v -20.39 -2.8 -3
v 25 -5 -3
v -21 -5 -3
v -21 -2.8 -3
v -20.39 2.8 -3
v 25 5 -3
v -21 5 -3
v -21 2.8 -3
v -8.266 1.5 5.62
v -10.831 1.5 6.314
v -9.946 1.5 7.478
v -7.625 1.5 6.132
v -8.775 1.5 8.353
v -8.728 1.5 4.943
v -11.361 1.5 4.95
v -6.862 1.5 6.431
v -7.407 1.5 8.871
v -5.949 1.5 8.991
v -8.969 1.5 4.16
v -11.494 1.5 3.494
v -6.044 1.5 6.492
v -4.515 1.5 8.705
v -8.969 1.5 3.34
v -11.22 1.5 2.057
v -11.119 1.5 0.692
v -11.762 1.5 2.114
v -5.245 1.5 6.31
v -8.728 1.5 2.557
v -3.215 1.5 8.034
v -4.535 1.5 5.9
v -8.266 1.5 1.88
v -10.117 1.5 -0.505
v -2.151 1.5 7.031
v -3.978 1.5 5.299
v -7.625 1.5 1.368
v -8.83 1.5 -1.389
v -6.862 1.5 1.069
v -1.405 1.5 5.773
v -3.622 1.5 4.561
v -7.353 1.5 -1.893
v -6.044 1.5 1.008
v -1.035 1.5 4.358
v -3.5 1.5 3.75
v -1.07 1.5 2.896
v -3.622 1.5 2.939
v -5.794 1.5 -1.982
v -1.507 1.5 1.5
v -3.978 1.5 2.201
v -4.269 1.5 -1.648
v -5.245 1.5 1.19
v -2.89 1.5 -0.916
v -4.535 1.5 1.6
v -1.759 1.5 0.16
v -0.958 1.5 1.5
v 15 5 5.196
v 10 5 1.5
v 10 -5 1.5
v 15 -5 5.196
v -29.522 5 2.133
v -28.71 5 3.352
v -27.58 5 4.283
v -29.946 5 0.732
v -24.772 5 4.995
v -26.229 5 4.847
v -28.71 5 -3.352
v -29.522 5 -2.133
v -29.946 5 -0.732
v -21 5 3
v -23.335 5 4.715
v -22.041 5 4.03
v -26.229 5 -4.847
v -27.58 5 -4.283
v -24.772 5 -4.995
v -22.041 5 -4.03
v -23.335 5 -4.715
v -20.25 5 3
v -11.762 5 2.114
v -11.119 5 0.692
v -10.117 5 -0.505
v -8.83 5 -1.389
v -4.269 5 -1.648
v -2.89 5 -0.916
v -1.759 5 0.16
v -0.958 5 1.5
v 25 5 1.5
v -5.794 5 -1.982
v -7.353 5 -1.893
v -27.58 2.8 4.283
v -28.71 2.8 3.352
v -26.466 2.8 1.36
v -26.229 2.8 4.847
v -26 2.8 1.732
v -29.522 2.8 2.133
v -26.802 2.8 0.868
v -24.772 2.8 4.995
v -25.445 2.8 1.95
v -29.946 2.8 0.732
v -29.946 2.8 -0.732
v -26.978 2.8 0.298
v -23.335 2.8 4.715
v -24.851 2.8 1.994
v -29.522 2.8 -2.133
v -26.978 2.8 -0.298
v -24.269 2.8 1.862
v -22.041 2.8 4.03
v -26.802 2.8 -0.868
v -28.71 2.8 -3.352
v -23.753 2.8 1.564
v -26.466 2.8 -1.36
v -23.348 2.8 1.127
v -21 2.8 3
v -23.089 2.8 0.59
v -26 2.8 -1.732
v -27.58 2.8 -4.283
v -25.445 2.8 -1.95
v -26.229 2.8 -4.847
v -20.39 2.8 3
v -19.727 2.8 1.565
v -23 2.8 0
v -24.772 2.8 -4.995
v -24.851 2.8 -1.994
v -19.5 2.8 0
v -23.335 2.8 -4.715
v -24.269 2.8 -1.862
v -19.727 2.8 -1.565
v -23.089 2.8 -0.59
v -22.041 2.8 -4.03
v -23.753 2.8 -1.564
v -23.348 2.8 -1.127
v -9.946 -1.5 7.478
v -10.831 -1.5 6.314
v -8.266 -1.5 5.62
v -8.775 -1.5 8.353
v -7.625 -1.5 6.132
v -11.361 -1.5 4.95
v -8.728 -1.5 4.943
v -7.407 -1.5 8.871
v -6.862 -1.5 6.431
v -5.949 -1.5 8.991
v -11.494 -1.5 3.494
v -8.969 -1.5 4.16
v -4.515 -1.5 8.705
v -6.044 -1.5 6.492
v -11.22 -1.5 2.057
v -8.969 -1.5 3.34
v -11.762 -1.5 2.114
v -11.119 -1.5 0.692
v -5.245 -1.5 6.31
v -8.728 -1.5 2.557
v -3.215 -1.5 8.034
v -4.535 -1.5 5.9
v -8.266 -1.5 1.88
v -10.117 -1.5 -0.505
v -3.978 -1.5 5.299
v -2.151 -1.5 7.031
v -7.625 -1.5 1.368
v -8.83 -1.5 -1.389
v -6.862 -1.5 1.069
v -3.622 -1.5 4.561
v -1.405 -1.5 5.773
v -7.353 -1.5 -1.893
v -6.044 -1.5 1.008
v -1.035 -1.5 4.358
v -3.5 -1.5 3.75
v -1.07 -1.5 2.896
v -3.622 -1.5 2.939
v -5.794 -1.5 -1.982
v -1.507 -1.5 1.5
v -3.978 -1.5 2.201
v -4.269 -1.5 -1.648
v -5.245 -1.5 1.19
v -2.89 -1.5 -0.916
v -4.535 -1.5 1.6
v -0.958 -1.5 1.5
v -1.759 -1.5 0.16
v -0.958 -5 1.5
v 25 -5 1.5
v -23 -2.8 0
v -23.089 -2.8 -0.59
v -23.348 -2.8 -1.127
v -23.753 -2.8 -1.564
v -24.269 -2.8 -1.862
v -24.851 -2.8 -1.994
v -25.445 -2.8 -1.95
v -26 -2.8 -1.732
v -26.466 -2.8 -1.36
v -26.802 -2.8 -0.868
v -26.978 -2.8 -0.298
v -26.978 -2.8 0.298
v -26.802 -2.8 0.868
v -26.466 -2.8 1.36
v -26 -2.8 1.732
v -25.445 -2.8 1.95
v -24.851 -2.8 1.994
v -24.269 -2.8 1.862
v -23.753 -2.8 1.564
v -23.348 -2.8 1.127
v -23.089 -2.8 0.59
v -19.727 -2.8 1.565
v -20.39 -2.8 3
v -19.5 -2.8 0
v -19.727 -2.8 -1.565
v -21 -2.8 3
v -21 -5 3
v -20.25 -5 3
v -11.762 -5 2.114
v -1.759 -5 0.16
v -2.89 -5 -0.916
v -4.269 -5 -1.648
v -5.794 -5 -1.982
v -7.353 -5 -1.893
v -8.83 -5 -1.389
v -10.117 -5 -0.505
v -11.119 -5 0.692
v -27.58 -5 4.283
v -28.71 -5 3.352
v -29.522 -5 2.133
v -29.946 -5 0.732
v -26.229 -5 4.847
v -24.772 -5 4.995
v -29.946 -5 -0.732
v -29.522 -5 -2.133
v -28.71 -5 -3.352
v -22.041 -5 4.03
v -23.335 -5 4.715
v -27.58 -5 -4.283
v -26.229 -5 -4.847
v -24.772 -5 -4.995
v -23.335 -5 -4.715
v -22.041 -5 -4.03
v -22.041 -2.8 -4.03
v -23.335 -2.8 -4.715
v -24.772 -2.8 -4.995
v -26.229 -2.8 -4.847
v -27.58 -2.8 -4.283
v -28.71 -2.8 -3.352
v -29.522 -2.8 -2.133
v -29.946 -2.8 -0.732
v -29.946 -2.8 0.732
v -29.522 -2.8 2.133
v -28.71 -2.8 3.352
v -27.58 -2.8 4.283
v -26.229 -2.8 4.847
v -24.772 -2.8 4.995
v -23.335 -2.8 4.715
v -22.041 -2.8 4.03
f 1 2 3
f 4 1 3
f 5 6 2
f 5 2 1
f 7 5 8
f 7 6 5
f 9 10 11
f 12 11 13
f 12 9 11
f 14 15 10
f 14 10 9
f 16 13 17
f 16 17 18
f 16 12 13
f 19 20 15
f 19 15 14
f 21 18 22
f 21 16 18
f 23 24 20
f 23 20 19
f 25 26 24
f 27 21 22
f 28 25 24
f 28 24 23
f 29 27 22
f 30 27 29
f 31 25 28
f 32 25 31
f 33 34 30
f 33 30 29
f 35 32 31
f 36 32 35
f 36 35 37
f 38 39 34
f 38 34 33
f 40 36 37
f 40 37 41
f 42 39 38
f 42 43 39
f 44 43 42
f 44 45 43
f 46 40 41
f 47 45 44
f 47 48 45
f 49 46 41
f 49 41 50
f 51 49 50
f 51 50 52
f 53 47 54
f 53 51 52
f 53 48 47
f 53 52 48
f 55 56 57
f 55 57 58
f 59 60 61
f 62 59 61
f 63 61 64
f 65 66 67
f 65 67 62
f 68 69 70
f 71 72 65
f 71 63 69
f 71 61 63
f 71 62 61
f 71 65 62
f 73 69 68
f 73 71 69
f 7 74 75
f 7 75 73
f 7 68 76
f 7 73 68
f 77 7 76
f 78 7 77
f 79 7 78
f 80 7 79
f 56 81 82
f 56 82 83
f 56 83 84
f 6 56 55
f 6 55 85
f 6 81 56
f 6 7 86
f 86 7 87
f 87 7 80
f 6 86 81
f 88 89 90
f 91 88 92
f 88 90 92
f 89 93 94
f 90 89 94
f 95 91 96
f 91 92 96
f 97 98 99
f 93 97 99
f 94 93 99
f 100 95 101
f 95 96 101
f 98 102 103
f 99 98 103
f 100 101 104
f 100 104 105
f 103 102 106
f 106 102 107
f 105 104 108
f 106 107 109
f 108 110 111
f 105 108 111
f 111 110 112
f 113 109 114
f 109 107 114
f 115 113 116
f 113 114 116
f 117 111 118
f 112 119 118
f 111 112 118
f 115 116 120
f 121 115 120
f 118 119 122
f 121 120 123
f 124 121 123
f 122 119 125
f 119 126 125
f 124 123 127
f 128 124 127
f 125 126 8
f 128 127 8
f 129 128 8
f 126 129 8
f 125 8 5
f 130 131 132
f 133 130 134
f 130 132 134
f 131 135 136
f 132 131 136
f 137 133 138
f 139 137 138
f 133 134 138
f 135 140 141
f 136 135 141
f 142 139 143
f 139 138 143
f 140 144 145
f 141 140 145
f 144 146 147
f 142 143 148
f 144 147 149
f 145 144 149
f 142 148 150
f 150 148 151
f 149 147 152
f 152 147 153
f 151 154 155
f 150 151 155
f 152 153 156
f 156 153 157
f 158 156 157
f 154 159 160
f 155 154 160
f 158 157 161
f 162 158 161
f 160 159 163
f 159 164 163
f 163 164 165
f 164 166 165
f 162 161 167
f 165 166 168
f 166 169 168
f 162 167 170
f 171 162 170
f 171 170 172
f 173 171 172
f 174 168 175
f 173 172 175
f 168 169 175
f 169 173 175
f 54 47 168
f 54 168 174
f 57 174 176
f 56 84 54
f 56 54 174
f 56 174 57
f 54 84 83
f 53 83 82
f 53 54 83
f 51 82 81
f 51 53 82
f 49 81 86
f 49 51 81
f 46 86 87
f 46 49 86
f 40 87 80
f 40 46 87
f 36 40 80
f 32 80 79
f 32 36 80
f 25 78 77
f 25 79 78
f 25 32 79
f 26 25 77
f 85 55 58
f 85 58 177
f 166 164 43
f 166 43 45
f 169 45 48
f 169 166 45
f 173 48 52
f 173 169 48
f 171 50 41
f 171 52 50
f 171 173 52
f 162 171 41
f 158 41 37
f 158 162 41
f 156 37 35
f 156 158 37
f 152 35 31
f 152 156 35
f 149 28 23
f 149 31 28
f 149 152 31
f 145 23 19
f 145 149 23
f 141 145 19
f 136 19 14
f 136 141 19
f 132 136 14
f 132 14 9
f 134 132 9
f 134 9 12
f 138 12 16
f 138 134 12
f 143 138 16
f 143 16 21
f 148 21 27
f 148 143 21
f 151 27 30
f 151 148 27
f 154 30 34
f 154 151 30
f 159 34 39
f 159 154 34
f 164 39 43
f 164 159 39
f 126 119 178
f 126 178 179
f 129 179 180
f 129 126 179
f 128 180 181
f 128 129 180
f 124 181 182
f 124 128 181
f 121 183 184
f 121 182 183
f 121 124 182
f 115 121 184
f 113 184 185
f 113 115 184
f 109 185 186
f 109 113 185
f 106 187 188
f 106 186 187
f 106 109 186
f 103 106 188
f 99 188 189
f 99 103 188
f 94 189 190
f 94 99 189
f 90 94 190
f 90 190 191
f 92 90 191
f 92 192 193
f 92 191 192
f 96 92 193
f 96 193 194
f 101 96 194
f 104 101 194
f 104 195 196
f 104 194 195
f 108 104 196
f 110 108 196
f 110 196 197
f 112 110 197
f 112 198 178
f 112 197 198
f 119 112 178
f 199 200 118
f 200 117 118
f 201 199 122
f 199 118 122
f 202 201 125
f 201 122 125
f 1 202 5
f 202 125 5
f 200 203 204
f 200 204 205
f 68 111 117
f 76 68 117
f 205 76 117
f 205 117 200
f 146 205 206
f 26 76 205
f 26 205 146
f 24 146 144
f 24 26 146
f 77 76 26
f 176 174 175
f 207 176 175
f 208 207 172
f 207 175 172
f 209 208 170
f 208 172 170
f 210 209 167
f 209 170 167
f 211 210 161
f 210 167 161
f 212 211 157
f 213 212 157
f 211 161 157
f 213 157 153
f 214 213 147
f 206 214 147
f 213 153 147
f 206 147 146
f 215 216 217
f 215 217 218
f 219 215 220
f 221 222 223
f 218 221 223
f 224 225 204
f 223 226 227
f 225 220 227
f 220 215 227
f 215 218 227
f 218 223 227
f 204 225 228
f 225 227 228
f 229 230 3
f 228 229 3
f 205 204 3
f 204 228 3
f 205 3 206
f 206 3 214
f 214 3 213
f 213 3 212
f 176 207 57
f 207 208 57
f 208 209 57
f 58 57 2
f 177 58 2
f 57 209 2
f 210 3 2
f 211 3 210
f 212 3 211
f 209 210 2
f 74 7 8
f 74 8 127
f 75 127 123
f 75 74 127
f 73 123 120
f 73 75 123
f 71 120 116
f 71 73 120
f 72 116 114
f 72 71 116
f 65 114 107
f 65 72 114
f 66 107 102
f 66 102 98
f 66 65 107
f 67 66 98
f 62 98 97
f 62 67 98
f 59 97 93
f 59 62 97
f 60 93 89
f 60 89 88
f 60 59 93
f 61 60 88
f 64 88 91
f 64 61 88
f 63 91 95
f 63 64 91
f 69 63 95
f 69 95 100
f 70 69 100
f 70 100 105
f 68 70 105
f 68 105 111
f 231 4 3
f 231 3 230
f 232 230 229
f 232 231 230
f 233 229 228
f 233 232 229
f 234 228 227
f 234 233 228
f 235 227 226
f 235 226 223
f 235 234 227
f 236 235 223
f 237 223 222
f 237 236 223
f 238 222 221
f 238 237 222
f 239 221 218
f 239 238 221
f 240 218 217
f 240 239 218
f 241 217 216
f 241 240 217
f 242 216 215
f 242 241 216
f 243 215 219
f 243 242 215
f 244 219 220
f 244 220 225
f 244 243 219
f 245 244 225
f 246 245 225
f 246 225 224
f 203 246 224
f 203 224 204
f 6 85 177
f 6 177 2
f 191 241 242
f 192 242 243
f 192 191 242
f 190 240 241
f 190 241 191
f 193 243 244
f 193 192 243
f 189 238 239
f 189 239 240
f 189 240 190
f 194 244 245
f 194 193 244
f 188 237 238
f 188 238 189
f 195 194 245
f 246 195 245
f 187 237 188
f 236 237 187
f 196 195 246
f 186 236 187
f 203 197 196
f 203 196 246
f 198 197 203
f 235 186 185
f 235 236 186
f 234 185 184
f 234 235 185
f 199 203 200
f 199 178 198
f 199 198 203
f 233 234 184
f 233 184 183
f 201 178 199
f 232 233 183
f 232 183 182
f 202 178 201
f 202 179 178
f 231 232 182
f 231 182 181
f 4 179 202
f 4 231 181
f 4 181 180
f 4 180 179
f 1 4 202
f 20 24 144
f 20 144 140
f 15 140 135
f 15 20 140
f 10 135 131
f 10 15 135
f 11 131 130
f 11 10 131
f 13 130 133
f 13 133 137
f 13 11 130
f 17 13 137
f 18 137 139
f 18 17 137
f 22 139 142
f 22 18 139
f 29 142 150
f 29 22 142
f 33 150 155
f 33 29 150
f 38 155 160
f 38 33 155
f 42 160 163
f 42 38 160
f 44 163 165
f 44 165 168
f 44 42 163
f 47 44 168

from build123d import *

# Parameters (mm, degrees)
SKETCH2_R               = 2.75
SKETCH2_R_2             = 2
BOSS_EXTRUDE1_DEPTH     = 5
CUT_EXTRUDE1_START      = 1.5
SKETCH4_R               = 5.75
CUT_EXTRUDE1_DEPTH      = 4.5
CUT_EXTRUDE2_START      = -5
SKETCH5_R               = 5.5
CUT_EXTRUDE2_DEPTH      = 2.8
CUT_EXTRUDE2_DEPTH_BACK = 2.8
SKETCH6_R               = 2
BOSS_EXTRUDE2_DEPTH     = 10


with BuildPart() as part:
    # Sketch2 → Boss-Extrude1 (new body, symmetric)
    with BuildSketch(Plane(origin=(0, 0, 0), x_dir=(1, 0, 0), z_dir=(0, 1, 0))):
        with BuildLine():
            ThreePointArc((-11.219654399, -2.057358528), (-5.949237585, -8.991377869), (-1.50658351, -1.5))
            Line((-1.50658351, -1.5), (10, -1.5))
            Line((10, -1.5), (15, -5.195678453))
            Line((15, -5.195678453), (25, -1.5))
            Line((25, -1.5), (25, 3))
            Line((25, 3), (-21, 3))
            ThreePointArc((-21, 3), (-30, 0), (-21, -3))
            Line((-21, -3), (-20.25, -3))
            Line((-20.25, -3), (-11.219654399, -2.057358528))
        make_face()
        with Locations((-6.25, -3.75)):
            Circle(SKETCH2_R, mode=Mode.SUBTRACT)
        with Locations((-25, 0)):
            Circle(SKETCH2_R_2, mode=Mode.SUBTRACT)
    extrude(amount=BOSS_EXTRUDE1_DEPTH, both=True)

    # Sketch4 → Cut-Extrude1 (cut, through all)
    with BuildSketch(Plane(origin=(0, 0, 0), x_dir=(1, 0, 0), z_dir=(0, 1, 0)).offset(CUT_EXTRUDE1_START)):
        with Locations((-6.25, -3.75)):
            Circle(SKETCH4_R)
    cut_extrude1 = extrude(amount=CUT_EXTRUDE1_DEPTH, mode=Mode.SUBTRACT)

    # Sketch5 → Cut-Extrude2 (cut, two sides)
    with BuildSketch(Plane(origin=(0, 5, 0), x_dir=(1, 0, 0), z_dir=(0, 1, 0)).offset(CUT_EXTRUDE2_START)) as cut_extrude2_sk:
        with Locations((-25, 0)):
            Circle(SKETCH5_R)
    extrude(amount=CUT_EXTRUDE2_DEPTH, mode=Mode.SUBTRACT)
    extrude(cut_extrude2_sk.sketch, amount=-CUT_EXTRUDE2_DEPTH_BACK, mode=Mode.SUBTRACT)

    # Mirror1: Cut-Extrude1 across plane
    add(cut_extrude1.mirror(Plane.ZX), mode=Mode.SUBTRACT)

    # Sketch6 → Boss-Extrude2 (add)
    with BuildSketch(Plane(origin=(0, 5, 0), x_dir=(1, 0, 0), z_dir=(0, 1, 0))):
        with Locations((-25, 0)):
            Circle(SKETCH6_R)
    extrude(amount=-BOSS_EXTRUDE2_DEPTH)


solid = part.part
